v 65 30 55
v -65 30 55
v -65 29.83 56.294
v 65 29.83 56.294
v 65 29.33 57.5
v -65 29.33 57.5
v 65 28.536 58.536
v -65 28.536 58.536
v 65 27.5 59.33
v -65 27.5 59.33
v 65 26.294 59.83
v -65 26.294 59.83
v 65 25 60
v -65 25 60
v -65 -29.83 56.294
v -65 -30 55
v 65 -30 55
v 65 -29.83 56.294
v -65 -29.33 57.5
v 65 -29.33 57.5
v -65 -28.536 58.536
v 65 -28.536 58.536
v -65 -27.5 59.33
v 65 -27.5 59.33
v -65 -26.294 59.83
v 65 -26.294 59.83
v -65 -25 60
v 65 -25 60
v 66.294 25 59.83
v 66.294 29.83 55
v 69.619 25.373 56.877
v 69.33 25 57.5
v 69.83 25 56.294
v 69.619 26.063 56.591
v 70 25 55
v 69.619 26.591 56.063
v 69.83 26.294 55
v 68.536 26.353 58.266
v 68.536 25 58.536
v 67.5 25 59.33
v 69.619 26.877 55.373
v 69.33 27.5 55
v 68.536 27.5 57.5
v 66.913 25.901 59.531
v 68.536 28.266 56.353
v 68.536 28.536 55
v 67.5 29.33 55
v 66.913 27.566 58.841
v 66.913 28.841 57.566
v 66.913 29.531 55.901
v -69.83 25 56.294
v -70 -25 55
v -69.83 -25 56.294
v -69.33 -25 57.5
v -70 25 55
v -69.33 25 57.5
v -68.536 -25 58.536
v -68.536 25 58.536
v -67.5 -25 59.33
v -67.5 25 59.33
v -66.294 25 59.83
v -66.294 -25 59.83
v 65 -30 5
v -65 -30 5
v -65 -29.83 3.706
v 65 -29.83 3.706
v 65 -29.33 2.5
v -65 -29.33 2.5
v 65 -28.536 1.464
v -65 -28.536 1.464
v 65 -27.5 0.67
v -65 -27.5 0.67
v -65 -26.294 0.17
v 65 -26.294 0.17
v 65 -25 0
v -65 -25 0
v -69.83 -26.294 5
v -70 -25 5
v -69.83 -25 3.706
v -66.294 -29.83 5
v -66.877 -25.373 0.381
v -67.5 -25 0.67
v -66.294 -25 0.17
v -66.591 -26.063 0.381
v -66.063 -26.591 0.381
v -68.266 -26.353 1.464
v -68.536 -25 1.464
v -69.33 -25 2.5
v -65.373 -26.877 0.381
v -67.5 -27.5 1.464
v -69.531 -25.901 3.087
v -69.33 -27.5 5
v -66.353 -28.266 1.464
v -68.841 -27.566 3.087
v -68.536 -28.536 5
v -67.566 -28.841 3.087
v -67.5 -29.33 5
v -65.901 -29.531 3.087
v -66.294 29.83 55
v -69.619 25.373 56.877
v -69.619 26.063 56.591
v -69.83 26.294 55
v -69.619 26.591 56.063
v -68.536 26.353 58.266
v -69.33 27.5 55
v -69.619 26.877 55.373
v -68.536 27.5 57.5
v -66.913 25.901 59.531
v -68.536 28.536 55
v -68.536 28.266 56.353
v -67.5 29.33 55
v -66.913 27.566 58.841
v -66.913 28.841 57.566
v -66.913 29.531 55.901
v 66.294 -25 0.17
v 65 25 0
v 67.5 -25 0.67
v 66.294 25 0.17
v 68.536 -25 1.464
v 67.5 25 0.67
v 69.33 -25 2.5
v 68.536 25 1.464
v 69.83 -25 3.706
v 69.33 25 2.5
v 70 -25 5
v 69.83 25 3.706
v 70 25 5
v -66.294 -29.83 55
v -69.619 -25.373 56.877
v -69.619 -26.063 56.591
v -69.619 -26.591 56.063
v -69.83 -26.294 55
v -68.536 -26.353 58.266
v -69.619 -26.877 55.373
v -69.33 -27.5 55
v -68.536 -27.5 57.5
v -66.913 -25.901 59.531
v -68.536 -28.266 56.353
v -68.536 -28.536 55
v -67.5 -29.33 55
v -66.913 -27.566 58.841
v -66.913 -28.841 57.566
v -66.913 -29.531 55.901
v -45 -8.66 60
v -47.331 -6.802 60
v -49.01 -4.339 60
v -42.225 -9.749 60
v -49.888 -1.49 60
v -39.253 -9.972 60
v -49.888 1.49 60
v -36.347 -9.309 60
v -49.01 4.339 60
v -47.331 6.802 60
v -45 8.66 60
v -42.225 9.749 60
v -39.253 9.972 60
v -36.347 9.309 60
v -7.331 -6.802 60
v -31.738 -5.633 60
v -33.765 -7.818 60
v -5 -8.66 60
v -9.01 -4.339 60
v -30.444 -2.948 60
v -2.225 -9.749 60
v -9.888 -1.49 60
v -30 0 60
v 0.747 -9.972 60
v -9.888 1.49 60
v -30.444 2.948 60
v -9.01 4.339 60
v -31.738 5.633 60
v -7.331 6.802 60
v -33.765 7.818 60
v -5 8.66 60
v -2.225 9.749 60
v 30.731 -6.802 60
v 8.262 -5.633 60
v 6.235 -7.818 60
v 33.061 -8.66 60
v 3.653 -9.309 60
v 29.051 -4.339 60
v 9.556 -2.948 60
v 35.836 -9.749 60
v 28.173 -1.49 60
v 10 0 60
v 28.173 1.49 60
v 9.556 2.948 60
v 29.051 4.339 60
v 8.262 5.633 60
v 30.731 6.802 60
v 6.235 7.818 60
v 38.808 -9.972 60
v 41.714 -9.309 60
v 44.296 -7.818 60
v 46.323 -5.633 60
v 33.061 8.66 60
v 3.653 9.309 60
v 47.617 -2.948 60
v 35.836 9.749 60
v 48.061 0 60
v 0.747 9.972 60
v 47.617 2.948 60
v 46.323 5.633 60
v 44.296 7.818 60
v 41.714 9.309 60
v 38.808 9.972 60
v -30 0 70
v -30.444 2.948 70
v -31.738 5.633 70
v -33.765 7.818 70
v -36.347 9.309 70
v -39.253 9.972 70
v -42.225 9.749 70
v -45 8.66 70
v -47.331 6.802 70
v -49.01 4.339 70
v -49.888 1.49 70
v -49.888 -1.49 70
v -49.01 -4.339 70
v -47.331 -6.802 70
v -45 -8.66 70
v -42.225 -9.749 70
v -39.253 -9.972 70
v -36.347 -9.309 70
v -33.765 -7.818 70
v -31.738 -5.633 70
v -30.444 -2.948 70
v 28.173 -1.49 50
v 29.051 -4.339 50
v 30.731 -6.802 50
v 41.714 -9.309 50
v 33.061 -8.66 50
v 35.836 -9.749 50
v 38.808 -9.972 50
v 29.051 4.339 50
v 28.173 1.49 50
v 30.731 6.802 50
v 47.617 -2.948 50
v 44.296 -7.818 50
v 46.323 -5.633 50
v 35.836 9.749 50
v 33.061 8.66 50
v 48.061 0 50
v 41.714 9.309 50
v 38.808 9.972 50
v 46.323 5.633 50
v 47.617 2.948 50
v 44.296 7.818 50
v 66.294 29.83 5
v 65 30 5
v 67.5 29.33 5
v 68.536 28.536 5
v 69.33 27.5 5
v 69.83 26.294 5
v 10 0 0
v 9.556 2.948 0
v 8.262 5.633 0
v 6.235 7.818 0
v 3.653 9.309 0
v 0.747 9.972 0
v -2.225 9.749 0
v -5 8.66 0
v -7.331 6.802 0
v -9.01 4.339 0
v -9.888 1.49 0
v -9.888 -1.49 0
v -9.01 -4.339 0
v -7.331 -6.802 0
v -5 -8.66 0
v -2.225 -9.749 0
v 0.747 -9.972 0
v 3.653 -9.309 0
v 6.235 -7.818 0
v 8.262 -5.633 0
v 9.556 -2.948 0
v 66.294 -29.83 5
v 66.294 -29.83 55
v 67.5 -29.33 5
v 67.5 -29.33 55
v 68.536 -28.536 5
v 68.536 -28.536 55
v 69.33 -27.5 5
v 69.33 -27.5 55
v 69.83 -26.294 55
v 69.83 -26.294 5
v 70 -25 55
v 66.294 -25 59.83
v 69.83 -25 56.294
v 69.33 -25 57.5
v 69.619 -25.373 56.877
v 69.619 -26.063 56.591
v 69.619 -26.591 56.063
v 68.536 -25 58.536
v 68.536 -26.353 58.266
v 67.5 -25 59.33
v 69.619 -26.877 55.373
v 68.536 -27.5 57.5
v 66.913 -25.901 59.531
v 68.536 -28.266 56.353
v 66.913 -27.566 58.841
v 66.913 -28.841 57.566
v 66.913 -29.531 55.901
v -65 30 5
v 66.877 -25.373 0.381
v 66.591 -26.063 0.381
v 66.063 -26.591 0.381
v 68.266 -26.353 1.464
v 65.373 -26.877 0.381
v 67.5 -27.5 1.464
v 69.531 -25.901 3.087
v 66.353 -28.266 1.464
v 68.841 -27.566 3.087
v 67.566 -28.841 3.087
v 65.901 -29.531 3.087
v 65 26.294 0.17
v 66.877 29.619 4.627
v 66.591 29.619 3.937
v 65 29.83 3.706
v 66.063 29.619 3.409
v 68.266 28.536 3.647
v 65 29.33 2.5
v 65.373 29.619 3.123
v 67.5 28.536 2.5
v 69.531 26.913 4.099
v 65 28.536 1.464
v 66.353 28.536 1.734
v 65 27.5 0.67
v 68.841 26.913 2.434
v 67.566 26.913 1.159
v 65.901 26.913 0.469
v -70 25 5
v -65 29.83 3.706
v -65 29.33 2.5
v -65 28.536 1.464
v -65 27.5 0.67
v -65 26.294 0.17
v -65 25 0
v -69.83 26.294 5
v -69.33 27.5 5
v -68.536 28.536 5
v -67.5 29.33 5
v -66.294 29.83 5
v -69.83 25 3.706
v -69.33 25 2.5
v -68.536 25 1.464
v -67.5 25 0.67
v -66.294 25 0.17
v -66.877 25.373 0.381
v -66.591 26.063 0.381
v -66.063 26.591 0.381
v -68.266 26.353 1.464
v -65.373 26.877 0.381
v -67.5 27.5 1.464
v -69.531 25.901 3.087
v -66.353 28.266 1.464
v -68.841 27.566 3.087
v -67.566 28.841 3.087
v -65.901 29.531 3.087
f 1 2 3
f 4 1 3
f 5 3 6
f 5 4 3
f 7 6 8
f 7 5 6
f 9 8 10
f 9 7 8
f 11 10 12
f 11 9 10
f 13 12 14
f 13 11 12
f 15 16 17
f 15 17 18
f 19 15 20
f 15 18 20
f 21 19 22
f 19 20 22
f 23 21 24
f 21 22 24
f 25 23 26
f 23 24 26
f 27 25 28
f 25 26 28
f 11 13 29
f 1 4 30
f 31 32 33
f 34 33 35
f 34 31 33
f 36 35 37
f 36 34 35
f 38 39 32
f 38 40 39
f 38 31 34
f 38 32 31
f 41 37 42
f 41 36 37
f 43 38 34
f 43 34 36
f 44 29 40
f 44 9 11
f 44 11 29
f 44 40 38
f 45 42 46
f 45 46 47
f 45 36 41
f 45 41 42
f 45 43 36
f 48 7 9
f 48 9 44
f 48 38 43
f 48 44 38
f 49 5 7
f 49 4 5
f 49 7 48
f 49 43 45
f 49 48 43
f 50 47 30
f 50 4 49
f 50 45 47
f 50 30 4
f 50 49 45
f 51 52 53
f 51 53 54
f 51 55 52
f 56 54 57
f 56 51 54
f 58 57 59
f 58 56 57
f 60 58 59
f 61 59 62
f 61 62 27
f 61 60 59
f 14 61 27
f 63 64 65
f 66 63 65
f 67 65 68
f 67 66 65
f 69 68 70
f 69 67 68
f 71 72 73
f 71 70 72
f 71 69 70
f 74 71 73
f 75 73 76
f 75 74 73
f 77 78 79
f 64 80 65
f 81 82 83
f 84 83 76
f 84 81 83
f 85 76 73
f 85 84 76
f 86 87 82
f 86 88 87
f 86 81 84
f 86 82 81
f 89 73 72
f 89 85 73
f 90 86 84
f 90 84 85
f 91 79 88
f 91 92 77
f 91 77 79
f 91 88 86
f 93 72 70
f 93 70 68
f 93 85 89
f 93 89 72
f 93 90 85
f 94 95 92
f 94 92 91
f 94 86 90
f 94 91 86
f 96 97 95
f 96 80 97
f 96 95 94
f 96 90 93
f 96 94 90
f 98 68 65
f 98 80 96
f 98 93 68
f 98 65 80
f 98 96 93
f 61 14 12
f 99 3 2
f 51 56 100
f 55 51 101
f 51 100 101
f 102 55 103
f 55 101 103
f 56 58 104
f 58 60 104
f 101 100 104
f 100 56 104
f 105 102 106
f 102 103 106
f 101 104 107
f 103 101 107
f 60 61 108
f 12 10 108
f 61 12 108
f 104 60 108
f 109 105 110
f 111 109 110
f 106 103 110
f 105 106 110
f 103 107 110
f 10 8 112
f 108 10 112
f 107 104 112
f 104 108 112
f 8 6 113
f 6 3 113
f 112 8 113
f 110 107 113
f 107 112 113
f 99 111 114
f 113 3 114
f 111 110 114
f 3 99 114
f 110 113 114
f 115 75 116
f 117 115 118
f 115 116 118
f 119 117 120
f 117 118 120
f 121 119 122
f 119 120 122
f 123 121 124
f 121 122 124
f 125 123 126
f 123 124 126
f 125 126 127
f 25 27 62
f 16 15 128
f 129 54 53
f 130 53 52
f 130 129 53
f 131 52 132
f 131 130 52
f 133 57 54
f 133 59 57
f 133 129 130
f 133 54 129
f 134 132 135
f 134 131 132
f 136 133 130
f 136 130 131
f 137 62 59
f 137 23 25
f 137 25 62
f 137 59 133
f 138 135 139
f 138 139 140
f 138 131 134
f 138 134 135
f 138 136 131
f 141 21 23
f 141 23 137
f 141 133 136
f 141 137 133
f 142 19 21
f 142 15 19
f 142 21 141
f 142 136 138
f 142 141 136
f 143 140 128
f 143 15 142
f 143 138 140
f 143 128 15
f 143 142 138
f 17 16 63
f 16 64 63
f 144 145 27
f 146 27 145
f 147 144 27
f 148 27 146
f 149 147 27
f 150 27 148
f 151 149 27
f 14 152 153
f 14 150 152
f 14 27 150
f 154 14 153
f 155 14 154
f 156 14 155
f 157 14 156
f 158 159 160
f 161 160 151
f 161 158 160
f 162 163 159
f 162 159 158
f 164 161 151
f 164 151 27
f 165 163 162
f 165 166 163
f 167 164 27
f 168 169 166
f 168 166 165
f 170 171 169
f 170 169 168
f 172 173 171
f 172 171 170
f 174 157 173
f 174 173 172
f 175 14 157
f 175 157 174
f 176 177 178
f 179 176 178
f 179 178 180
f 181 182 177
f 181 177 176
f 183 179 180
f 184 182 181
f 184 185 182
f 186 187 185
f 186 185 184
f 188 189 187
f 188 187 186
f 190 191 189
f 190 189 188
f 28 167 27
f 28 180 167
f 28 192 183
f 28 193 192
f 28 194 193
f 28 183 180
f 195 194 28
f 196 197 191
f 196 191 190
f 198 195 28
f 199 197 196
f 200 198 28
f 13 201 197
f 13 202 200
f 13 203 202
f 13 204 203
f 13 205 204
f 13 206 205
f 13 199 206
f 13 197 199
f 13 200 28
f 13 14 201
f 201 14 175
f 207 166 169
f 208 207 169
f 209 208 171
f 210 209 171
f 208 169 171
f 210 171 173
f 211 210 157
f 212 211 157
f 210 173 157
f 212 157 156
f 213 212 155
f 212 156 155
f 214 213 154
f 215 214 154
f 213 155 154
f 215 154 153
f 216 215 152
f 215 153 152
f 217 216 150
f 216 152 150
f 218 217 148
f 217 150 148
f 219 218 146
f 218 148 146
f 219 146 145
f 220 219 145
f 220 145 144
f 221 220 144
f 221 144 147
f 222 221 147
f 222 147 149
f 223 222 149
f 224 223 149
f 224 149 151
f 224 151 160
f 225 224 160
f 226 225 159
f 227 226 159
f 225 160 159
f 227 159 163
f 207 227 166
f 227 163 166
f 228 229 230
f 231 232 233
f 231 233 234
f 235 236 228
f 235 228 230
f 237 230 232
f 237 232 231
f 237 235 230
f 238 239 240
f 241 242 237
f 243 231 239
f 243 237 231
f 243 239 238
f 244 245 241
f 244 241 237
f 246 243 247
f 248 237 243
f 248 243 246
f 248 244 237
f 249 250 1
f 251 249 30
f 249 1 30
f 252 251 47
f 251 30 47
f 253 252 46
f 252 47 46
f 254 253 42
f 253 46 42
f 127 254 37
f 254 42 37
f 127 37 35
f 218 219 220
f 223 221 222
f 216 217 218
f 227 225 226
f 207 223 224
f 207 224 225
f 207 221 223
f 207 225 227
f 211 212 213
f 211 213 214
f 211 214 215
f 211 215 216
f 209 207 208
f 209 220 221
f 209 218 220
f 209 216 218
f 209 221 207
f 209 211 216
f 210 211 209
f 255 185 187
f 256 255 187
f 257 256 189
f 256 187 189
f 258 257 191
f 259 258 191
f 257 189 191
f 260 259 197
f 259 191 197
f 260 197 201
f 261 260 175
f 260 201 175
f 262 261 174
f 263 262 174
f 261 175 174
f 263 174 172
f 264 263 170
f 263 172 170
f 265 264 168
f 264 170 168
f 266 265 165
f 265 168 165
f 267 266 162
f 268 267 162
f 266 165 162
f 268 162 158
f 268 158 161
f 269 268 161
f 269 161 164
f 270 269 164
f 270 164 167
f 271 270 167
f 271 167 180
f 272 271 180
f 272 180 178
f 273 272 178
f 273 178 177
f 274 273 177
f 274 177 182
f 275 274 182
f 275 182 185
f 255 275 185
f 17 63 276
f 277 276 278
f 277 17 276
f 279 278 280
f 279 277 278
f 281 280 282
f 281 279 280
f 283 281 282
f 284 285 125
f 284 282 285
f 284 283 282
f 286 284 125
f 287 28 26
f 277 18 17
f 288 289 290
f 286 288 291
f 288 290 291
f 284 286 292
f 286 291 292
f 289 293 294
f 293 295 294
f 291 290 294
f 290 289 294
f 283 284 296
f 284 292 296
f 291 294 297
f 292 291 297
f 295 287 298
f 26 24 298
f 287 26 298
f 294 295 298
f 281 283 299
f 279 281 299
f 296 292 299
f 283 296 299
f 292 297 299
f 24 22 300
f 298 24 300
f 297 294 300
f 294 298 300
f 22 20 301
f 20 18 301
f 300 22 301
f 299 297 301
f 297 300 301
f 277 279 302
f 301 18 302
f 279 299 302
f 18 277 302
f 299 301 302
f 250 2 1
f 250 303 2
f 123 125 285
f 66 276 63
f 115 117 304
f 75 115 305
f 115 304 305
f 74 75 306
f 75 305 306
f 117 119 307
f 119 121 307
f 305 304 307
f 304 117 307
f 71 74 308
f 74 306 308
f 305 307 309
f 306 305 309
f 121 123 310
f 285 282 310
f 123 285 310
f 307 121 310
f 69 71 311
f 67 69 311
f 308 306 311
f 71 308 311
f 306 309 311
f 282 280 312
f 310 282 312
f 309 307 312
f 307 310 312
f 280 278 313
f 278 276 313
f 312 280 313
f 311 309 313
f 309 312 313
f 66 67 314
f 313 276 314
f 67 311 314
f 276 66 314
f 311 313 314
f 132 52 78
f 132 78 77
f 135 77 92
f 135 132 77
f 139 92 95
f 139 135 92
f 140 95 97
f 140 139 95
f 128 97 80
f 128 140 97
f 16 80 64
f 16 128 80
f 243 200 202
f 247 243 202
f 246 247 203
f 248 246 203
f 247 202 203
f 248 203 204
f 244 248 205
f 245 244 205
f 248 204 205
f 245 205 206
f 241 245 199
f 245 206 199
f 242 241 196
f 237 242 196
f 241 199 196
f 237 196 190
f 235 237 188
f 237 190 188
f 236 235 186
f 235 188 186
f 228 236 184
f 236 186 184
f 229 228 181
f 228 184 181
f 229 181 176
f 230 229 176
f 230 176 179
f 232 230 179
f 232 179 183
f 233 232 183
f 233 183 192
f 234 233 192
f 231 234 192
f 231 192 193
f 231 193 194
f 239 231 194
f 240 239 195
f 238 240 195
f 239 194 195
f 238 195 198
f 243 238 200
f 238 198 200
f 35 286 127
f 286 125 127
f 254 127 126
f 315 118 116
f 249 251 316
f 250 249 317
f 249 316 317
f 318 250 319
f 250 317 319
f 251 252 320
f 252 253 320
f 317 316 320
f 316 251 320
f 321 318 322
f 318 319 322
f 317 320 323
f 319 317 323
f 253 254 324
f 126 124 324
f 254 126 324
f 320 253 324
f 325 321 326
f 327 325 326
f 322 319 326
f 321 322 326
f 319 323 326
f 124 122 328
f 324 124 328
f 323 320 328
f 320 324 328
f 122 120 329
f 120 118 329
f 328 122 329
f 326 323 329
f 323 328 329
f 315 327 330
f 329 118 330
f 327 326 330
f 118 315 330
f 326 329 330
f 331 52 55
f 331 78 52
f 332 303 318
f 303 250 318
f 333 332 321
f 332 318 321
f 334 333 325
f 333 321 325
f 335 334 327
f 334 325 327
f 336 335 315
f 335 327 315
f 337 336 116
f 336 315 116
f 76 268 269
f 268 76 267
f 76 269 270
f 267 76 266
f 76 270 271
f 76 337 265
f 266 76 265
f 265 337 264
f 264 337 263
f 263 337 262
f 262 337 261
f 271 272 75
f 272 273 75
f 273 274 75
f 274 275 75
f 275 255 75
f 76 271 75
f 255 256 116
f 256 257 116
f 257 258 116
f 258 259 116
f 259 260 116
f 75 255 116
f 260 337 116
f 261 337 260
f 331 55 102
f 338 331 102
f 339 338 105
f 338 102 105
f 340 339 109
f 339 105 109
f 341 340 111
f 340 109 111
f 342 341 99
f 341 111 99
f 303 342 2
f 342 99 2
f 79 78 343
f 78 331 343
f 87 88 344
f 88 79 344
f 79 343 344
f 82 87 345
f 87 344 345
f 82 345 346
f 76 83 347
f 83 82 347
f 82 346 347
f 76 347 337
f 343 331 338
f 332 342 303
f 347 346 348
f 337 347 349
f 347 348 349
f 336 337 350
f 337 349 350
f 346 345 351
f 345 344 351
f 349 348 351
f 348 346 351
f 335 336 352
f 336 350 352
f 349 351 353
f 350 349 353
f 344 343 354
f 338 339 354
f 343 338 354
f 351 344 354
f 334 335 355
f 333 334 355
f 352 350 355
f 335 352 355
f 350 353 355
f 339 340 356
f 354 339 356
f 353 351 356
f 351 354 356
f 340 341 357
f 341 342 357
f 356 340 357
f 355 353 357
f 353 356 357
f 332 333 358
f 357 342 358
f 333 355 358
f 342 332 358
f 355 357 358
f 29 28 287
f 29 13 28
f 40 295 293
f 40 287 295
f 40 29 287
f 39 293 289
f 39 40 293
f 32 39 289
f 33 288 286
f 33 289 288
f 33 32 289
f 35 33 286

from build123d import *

# Parameters (mm, degrees)
F0_W     = 140
F0_H     = 60
F1_DEPTH = 60
F2_R     = 10
F5_DEPTH = 10
F3_R     = 10
F6_DEPTH = 10
F4_R     = 10
F7_DEPTH = 877
F8_R     = 5


with BuildPart() as f1:
    # F0 (on Top) → F1 (new body)
    with BuildSketch(Plane.XY):
        Rectangle(F0_W, F0_H)
    extrude(amount=F1_DEPTH)

    # F2 (on face) → F5 (join)
    with BuildSketch(Plane.XY.offset(60)):
        with Locations((-40, 0)):
            Circle(F2_R)
    extrude(amount=F5_DEPTH)

    # F3 (on face) → F6 (cut)
    with BuildSketch(Plane.XY.offset(60)):
        with Locations((38.061067, 0)):
            Circle(F3_R)
    extrude(amount=-F6_DEPTH, mode=Mode.SUBTRACT)

    # F4 (on face) → F7 (cut)
    with BuildSketch(Plane.XY.offset(60)):
        Circle(F4_R)
    extrude(amount=-F7_DEPTH, mode=Mode.SUBTRACT)

    # F8
    f8_edges = [f1.edges().sort_by_distance(p)[0] for p in [
        (0, -30, 60),
        (0, 30, 60),
        (-70, 0, 60),
        (70, 0, 60),
        (-70, -30, 30),
        (-70, 30, 30),
        (-70, 0, 0),
        (70, -30, 30),
        (70, 0, 0),
        (70, 30, 30),
        (0, -30, 0),
        (0, 30, 0),
    ]]
    fillet(f8_edges, radius=F8_R)


solid = f1.part
